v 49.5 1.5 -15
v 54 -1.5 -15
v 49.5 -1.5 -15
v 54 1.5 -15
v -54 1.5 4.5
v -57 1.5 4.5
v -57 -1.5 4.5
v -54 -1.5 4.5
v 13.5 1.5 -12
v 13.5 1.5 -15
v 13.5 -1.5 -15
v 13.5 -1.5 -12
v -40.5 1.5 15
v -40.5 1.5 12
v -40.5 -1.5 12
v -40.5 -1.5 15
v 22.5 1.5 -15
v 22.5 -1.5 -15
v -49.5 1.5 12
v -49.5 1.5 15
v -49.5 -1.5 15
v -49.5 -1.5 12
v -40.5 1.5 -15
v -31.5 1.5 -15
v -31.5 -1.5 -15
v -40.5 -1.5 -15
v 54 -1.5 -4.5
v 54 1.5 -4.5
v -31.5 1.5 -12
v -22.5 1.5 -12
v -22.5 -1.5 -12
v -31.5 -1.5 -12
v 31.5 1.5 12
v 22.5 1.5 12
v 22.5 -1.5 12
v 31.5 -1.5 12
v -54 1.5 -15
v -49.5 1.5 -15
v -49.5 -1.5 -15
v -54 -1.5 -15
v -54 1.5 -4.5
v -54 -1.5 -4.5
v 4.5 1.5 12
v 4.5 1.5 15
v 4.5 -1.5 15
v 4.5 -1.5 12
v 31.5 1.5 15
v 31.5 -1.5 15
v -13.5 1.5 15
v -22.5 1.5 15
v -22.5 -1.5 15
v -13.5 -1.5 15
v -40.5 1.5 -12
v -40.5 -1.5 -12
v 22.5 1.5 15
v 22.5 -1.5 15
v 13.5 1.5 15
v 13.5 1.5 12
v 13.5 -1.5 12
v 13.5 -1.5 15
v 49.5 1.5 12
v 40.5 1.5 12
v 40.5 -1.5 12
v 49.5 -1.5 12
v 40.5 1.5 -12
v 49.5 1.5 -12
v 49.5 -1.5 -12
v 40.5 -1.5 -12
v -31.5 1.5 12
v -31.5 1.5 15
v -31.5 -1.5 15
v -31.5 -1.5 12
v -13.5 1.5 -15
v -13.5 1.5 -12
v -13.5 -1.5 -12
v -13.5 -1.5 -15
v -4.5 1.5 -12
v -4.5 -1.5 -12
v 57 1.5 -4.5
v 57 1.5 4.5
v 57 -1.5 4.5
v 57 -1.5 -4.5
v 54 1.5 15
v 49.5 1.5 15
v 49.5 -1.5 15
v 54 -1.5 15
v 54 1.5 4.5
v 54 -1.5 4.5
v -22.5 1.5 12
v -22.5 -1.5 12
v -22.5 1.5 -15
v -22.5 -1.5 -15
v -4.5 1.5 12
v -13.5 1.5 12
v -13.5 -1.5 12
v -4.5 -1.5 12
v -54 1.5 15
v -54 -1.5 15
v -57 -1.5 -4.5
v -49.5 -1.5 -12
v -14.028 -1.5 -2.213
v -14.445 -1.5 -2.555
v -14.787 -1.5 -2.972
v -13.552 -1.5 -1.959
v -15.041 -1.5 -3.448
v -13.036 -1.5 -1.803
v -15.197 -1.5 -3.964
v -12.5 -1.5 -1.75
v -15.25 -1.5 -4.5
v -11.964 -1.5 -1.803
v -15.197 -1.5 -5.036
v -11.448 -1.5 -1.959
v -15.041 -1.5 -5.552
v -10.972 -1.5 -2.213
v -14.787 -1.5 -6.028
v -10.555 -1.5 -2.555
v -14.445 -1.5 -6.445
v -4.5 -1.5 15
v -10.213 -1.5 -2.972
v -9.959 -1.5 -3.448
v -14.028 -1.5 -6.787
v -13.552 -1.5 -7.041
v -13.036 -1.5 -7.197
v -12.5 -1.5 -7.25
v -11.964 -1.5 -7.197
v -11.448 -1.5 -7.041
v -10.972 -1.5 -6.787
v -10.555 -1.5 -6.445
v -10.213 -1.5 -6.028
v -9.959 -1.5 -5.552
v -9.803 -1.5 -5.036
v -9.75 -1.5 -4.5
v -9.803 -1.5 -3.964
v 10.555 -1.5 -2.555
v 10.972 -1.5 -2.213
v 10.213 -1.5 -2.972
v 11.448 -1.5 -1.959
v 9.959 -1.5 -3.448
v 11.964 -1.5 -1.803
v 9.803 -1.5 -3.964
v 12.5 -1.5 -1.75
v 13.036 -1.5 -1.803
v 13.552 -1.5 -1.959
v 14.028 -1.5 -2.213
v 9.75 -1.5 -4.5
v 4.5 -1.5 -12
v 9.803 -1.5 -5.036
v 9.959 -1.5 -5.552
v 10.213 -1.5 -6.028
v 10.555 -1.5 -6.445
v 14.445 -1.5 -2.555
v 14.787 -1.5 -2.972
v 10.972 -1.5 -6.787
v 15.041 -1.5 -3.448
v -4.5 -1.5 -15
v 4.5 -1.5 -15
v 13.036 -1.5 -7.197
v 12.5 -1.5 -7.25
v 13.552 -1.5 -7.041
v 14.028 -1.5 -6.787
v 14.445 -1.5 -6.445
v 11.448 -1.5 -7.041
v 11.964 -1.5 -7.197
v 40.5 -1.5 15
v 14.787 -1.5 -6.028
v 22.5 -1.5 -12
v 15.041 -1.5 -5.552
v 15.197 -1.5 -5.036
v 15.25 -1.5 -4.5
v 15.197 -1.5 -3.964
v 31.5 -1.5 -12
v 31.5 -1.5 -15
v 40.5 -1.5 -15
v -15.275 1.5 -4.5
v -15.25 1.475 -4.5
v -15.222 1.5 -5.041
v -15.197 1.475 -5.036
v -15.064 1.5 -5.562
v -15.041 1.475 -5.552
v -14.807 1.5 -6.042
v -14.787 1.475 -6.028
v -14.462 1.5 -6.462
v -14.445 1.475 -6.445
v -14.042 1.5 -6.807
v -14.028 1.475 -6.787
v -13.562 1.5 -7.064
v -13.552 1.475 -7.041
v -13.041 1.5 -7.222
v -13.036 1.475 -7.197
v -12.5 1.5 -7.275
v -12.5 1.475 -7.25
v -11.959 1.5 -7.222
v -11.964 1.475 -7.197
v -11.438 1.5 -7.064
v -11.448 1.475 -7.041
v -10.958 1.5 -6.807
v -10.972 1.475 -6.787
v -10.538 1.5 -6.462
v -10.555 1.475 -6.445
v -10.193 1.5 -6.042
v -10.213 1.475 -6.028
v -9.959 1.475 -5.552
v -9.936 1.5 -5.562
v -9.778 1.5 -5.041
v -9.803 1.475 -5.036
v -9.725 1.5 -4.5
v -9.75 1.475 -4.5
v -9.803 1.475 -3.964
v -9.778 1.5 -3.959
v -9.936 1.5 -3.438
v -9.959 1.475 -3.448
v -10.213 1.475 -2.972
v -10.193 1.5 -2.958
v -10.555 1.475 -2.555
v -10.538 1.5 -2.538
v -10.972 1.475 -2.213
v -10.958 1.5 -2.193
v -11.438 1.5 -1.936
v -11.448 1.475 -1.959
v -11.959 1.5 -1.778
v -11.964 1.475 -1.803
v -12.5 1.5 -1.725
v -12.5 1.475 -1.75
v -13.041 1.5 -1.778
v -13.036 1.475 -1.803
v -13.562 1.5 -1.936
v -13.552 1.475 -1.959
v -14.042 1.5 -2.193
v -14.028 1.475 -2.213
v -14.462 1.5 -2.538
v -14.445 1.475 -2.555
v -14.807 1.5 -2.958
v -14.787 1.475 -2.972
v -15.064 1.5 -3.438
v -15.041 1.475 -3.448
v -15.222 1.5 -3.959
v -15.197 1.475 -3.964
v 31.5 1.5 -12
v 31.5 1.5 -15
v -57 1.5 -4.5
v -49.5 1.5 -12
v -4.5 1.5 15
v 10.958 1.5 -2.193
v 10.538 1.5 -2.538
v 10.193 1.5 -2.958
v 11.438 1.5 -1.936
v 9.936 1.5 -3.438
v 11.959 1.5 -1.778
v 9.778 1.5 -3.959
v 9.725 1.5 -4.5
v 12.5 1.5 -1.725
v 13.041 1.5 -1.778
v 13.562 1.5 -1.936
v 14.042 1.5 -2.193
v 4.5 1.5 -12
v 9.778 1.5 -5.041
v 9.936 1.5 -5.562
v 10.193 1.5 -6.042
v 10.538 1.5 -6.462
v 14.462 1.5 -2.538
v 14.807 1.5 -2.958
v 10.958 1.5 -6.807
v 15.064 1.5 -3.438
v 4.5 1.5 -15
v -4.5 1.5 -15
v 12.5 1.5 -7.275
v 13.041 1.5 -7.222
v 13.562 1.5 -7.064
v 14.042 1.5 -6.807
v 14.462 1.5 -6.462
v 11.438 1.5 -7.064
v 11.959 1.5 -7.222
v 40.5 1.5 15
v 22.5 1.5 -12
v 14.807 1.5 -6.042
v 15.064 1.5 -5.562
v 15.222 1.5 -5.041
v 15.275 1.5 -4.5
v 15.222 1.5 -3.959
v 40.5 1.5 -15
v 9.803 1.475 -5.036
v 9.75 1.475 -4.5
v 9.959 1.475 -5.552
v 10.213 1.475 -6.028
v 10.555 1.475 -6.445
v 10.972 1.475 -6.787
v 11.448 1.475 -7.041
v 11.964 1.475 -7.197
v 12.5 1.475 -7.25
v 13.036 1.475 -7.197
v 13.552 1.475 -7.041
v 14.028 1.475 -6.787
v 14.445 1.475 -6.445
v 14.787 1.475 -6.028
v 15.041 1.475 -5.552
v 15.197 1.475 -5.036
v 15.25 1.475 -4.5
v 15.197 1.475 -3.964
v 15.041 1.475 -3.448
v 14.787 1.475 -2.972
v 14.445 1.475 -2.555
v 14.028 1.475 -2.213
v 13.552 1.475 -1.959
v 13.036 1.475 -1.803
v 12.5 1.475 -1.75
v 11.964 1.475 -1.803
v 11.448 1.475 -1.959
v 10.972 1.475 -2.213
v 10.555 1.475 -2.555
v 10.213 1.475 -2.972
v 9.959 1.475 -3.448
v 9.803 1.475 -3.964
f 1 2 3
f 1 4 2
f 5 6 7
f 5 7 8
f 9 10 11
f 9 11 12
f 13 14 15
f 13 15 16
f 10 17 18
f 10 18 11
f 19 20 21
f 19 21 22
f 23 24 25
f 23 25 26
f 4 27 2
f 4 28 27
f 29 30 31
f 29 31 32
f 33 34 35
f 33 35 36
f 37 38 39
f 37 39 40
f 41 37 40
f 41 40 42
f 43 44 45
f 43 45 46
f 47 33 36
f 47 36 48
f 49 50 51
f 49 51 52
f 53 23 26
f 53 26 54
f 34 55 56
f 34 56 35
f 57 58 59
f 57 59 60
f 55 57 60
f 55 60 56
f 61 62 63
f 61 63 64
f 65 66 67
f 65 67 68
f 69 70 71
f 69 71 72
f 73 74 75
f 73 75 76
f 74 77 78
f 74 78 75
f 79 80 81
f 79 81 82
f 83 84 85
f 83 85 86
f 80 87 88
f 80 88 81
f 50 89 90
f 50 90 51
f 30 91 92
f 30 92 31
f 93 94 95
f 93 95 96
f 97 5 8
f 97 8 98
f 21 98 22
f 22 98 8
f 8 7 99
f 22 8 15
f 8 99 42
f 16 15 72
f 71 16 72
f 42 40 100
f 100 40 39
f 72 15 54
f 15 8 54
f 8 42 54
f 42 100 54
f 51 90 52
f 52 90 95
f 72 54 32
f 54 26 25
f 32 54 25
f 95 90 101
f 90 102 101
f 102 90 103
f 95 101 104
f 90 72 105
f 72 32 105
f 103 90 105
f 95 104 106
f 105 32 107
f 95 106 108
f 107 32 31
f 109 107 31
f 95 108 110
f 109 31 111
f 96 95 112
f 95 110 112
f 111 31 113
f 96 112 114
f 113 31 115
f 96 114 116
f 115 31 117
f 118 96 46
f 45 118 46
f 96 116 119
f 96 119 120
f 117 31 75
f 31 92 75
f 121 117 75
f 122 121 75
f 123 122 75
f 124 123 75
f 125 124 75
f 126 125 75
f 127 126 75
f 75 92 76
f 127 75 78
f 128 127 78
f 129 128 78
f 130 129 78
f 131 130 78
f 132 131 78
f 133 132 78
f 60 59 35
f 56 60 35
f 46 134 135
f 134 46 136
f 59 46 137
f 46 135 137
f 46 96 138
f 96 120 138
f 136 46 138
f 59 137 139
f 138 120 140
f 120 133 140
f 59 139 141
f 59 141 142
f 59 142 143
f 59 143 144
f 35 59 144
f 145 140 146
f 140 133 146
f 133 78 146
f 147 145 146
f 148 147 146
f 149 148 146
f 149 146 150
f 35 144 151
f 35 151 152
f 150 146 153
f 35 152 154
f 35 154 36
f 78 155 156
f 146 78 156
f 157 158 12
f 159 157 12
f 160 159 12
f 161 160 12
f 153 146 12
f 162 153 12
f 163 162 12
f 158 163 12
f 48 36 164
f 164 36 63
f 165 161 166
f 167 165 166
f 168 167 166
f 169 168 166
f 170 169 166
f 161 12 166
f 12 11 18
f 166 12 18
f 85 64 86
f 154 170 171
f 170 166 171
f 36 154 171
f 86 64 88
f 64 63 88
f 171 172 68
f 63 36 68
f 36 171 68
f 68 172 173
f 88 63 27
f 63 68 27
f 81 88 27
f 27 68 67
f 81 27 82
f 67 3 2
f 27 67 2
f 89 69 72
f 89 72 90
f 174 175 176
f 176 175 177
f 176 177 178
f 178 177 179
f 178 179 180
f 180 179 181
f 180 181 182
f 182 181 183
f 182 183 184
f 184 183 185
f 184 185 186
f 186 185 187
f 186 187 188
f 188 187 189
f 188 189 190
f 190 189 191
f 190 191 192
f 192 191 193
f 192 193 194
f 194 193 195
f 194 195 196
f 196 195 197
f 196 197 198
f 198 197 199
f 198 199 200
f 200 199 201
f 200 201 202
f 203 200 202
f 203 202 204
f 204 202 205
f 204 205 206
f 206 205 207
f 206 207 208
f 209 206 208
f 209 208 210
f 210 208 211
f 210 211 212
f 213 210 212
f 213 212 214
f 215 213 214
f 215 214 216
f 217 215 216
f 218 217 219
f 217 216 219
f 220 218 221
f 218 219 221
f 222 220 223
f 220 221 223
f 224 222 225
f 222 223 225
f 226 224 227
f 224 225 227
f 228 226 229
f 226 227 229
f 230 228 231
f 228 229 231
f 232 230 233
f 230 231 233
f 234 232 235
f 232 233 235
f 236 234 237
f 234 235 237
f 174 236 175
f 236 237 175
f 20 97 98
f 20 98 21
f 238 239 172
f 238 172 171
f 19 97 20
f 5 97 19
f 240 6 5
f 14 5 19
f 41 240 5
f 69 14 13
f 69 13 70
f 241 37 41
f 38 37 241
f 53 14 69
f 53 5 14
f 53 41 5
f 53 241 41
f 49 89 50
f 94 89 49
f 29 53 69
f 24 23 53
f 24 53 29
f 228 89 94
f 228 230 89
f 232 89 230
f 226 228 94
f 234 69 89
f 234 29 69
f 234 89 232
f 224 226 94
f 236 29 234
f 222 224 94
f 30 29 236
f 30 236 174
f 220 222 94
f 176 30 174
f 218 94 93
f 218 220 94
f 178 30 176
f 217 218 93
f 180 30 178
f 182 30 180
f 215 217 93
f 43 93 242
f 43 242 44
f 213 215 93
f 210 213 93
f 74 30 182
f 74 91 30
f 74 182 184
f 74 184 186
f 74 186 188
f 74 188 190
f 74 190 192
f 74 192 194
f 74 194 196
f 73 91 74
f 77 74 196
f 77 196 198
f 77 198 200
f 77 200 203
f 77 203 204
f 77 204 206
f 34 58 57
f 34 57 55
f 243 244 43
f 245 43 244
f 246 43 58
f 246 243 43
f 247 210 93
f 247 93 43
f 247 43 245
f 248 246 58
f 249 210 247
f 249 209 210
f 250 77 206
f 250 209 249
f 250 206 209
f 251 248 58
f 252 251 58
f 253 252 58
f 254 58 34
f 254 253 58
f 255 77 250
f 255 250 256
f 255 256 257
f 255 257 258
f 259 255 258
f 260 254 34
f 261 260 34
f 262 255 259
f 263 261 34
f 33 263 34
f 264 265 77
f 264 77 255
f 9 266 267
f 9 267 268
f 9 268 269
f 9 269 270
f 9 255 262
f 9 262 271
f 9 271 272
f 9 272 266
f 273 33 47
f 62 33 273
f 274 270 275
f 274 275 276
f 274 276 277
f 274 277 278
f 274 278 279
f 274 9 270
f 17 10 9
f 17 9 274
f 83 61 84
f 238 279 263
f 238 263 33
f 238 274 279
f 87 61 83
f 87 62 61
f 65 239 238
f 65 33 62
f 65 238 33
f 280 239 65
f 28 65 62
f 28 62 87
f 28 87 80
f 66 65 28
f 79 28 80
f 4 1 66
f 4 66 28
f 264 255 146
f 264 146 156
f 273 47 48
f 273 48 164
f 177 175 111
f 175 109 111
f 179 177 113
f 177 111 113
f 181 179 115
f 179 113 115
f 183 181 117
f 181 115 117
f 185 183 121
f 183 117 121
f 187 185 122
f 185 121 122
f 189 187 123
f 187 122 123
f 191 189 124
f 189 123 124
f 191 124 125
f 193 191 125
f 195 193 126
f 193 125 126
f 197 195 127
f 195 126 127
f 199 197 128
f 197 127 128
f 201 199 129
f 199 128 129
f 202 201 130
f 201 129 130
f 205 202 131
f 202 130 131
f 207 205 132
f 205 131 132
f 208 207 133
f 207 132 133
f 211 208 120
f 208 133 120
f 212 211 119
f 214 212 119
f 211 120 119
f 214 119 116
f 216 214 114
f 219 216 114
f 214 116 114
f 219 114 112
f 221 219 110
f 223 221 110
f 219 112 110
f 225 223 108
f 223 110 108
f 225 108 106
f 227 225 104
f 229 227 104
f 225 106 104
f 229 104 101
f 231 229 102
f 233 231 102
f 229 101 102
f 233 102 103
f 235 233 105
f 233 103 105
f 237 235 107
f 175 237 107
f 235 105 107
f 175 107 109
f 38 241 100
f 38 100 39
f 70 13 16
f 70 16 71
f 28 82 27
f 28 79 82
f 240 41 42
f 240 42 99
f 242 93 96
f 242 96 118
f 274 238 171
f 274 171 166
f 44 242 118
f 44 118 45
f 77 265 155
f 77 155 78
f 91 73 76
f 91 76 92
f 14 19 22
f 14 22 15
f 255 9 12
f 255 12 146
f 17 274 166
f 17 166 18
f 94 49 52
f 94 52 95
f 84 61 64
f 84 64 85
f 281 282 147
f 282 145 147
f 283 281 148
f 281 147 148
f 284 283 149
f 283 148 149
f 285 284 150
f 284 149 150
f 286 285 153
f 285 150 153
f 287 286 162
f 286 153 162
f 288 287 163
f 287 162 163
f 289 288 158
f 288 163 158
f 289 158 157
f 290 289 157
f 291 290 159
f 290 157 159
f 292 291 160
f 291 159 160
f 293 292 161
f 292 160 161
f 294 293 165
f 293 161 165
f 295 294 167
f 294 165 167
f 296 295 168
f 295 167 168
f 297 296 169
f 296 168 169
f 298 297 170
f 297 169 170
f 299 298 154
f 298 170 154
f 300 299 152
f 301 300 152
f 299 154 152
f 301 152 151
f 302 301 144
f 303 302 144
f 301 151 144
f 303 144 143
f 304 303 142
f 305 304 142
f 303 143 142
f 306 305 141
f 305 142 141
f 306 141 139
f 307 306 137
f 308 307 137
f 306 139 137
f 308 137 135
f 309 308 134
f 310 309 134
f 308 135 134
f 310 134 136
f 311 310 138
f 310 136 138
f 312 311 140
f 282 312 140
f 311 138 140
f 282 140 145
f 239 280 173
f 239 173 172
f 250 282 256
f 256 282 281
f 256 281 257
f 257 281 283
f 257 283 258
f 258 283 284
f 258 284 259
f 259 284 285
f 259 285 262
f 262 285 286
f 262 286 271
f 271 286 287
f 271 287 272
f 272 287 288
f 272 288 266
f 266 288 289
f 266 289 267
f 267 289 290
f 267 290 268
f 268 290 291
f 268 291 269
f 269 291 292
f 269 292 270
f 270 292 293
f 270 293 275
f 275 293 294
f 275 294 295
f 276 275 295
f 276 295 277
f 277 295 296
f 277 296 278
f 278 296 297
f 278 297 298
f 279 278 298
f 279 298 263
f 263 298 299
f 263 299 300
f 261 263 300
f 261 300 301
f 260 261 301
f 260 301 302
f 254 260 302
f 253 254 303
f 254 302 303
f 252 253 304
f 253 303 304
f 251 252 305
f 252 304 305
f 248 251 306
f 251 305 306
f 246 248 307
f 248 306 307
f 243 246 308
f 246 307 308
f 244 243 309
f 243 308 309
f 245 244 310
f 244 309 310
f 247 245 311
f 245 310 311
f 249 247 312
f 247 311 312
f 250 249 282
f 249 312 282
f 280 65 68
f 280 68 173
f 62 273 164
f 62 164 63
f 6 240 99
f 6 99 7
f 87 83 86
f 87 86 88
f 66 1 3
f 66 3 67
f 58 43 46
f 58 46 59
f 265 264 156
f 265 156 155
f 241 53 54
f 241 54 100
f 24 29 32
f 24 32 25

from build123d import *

# Parameters (mm, degrees)
BOSS_EXTRUDE1_DEPTH            = 1.5
M5_CLEARANCE_HOLE1_D           = 5.5
M5_CLEARANCE_HOLE1_CSINK_D     = 5.55
M5_CLEARANCE_HOLE1_CSINK_ANGLE = 90


with BuildPart() as part:
    # Sketch1 → Boss-Extrude1 (new, symmetric)
    with BuildSketch(Plane(origin=(0, 0, 0), x_dir=(1, 0, 0), z_dir=(0, 1, 0))):
        Polygon((54, 15), (49.5, 15), (49.5, 12), (40.5, 12), (40.5, 15), (31.5, 15), (31.5, 12), (22.5, 12), (22.5, 15), (13.5, 15), (13.5, 12), (4.5, 12), (4.5, 15), (-4.5, 15), (-4.5, 12), (-13.5, 12), (-13.5, 15), (-22.5, 15), (-22.5, 12), (-31.5, 12), (-31.5, 15), (-40.5, 15), (-40.5, 12), (-49.5, 12), (-49.5, 15), (-54, 15), (-54, 12), (-54, 4.5), (-57, 4.5), (-57, -4.5), (-54, -4.5), (-54, -12), (-54, -15), (-49.5, -15), (-49.5, -12), (-40.5, -12), (-40.5, -15), (-31.5, -15), (-31.5, -12), (-22.5, -12), (-22.5, -15), (-13.5, -15), (-13.5, -12), (-4.5, -12), (-4.5, -15), (4.5, -15), (4.5, -12), (13.5, -12), (13.5, -15), (22.5, -15), (22.5, -12), (31.5, -12), (31.5, -15), (40.5, -15), (40.5, -12), (49.5, -12), (49.5, -15), (54, -15), (54, -12), (54, -4.5), (57, -4.5), (57, 4.5), (54, 4.5), (54, 12), align=None)
    extrude(amount=BOSS_EXTRUDE1_DEPTH, both=True)

    # M5 Clearance Hole1 (through all)
    with Locations(Plane(origin=(0, 1.5, 0), x_dir=(1, 0, 0), z_dir=(0, 1, 0))):
        with Locations((-12.5, 4.5), (12.5, 4.5)):
            CounterSinkHole(M5_CLEARANCE_HOLE1_D / 2, M5_CLEARANCE_HOLE1_CSINK_D / 2, counter_sink_angle=M5_CLEARANCE_HOLE1_CSINK_ANGLE)


solid = part.part
